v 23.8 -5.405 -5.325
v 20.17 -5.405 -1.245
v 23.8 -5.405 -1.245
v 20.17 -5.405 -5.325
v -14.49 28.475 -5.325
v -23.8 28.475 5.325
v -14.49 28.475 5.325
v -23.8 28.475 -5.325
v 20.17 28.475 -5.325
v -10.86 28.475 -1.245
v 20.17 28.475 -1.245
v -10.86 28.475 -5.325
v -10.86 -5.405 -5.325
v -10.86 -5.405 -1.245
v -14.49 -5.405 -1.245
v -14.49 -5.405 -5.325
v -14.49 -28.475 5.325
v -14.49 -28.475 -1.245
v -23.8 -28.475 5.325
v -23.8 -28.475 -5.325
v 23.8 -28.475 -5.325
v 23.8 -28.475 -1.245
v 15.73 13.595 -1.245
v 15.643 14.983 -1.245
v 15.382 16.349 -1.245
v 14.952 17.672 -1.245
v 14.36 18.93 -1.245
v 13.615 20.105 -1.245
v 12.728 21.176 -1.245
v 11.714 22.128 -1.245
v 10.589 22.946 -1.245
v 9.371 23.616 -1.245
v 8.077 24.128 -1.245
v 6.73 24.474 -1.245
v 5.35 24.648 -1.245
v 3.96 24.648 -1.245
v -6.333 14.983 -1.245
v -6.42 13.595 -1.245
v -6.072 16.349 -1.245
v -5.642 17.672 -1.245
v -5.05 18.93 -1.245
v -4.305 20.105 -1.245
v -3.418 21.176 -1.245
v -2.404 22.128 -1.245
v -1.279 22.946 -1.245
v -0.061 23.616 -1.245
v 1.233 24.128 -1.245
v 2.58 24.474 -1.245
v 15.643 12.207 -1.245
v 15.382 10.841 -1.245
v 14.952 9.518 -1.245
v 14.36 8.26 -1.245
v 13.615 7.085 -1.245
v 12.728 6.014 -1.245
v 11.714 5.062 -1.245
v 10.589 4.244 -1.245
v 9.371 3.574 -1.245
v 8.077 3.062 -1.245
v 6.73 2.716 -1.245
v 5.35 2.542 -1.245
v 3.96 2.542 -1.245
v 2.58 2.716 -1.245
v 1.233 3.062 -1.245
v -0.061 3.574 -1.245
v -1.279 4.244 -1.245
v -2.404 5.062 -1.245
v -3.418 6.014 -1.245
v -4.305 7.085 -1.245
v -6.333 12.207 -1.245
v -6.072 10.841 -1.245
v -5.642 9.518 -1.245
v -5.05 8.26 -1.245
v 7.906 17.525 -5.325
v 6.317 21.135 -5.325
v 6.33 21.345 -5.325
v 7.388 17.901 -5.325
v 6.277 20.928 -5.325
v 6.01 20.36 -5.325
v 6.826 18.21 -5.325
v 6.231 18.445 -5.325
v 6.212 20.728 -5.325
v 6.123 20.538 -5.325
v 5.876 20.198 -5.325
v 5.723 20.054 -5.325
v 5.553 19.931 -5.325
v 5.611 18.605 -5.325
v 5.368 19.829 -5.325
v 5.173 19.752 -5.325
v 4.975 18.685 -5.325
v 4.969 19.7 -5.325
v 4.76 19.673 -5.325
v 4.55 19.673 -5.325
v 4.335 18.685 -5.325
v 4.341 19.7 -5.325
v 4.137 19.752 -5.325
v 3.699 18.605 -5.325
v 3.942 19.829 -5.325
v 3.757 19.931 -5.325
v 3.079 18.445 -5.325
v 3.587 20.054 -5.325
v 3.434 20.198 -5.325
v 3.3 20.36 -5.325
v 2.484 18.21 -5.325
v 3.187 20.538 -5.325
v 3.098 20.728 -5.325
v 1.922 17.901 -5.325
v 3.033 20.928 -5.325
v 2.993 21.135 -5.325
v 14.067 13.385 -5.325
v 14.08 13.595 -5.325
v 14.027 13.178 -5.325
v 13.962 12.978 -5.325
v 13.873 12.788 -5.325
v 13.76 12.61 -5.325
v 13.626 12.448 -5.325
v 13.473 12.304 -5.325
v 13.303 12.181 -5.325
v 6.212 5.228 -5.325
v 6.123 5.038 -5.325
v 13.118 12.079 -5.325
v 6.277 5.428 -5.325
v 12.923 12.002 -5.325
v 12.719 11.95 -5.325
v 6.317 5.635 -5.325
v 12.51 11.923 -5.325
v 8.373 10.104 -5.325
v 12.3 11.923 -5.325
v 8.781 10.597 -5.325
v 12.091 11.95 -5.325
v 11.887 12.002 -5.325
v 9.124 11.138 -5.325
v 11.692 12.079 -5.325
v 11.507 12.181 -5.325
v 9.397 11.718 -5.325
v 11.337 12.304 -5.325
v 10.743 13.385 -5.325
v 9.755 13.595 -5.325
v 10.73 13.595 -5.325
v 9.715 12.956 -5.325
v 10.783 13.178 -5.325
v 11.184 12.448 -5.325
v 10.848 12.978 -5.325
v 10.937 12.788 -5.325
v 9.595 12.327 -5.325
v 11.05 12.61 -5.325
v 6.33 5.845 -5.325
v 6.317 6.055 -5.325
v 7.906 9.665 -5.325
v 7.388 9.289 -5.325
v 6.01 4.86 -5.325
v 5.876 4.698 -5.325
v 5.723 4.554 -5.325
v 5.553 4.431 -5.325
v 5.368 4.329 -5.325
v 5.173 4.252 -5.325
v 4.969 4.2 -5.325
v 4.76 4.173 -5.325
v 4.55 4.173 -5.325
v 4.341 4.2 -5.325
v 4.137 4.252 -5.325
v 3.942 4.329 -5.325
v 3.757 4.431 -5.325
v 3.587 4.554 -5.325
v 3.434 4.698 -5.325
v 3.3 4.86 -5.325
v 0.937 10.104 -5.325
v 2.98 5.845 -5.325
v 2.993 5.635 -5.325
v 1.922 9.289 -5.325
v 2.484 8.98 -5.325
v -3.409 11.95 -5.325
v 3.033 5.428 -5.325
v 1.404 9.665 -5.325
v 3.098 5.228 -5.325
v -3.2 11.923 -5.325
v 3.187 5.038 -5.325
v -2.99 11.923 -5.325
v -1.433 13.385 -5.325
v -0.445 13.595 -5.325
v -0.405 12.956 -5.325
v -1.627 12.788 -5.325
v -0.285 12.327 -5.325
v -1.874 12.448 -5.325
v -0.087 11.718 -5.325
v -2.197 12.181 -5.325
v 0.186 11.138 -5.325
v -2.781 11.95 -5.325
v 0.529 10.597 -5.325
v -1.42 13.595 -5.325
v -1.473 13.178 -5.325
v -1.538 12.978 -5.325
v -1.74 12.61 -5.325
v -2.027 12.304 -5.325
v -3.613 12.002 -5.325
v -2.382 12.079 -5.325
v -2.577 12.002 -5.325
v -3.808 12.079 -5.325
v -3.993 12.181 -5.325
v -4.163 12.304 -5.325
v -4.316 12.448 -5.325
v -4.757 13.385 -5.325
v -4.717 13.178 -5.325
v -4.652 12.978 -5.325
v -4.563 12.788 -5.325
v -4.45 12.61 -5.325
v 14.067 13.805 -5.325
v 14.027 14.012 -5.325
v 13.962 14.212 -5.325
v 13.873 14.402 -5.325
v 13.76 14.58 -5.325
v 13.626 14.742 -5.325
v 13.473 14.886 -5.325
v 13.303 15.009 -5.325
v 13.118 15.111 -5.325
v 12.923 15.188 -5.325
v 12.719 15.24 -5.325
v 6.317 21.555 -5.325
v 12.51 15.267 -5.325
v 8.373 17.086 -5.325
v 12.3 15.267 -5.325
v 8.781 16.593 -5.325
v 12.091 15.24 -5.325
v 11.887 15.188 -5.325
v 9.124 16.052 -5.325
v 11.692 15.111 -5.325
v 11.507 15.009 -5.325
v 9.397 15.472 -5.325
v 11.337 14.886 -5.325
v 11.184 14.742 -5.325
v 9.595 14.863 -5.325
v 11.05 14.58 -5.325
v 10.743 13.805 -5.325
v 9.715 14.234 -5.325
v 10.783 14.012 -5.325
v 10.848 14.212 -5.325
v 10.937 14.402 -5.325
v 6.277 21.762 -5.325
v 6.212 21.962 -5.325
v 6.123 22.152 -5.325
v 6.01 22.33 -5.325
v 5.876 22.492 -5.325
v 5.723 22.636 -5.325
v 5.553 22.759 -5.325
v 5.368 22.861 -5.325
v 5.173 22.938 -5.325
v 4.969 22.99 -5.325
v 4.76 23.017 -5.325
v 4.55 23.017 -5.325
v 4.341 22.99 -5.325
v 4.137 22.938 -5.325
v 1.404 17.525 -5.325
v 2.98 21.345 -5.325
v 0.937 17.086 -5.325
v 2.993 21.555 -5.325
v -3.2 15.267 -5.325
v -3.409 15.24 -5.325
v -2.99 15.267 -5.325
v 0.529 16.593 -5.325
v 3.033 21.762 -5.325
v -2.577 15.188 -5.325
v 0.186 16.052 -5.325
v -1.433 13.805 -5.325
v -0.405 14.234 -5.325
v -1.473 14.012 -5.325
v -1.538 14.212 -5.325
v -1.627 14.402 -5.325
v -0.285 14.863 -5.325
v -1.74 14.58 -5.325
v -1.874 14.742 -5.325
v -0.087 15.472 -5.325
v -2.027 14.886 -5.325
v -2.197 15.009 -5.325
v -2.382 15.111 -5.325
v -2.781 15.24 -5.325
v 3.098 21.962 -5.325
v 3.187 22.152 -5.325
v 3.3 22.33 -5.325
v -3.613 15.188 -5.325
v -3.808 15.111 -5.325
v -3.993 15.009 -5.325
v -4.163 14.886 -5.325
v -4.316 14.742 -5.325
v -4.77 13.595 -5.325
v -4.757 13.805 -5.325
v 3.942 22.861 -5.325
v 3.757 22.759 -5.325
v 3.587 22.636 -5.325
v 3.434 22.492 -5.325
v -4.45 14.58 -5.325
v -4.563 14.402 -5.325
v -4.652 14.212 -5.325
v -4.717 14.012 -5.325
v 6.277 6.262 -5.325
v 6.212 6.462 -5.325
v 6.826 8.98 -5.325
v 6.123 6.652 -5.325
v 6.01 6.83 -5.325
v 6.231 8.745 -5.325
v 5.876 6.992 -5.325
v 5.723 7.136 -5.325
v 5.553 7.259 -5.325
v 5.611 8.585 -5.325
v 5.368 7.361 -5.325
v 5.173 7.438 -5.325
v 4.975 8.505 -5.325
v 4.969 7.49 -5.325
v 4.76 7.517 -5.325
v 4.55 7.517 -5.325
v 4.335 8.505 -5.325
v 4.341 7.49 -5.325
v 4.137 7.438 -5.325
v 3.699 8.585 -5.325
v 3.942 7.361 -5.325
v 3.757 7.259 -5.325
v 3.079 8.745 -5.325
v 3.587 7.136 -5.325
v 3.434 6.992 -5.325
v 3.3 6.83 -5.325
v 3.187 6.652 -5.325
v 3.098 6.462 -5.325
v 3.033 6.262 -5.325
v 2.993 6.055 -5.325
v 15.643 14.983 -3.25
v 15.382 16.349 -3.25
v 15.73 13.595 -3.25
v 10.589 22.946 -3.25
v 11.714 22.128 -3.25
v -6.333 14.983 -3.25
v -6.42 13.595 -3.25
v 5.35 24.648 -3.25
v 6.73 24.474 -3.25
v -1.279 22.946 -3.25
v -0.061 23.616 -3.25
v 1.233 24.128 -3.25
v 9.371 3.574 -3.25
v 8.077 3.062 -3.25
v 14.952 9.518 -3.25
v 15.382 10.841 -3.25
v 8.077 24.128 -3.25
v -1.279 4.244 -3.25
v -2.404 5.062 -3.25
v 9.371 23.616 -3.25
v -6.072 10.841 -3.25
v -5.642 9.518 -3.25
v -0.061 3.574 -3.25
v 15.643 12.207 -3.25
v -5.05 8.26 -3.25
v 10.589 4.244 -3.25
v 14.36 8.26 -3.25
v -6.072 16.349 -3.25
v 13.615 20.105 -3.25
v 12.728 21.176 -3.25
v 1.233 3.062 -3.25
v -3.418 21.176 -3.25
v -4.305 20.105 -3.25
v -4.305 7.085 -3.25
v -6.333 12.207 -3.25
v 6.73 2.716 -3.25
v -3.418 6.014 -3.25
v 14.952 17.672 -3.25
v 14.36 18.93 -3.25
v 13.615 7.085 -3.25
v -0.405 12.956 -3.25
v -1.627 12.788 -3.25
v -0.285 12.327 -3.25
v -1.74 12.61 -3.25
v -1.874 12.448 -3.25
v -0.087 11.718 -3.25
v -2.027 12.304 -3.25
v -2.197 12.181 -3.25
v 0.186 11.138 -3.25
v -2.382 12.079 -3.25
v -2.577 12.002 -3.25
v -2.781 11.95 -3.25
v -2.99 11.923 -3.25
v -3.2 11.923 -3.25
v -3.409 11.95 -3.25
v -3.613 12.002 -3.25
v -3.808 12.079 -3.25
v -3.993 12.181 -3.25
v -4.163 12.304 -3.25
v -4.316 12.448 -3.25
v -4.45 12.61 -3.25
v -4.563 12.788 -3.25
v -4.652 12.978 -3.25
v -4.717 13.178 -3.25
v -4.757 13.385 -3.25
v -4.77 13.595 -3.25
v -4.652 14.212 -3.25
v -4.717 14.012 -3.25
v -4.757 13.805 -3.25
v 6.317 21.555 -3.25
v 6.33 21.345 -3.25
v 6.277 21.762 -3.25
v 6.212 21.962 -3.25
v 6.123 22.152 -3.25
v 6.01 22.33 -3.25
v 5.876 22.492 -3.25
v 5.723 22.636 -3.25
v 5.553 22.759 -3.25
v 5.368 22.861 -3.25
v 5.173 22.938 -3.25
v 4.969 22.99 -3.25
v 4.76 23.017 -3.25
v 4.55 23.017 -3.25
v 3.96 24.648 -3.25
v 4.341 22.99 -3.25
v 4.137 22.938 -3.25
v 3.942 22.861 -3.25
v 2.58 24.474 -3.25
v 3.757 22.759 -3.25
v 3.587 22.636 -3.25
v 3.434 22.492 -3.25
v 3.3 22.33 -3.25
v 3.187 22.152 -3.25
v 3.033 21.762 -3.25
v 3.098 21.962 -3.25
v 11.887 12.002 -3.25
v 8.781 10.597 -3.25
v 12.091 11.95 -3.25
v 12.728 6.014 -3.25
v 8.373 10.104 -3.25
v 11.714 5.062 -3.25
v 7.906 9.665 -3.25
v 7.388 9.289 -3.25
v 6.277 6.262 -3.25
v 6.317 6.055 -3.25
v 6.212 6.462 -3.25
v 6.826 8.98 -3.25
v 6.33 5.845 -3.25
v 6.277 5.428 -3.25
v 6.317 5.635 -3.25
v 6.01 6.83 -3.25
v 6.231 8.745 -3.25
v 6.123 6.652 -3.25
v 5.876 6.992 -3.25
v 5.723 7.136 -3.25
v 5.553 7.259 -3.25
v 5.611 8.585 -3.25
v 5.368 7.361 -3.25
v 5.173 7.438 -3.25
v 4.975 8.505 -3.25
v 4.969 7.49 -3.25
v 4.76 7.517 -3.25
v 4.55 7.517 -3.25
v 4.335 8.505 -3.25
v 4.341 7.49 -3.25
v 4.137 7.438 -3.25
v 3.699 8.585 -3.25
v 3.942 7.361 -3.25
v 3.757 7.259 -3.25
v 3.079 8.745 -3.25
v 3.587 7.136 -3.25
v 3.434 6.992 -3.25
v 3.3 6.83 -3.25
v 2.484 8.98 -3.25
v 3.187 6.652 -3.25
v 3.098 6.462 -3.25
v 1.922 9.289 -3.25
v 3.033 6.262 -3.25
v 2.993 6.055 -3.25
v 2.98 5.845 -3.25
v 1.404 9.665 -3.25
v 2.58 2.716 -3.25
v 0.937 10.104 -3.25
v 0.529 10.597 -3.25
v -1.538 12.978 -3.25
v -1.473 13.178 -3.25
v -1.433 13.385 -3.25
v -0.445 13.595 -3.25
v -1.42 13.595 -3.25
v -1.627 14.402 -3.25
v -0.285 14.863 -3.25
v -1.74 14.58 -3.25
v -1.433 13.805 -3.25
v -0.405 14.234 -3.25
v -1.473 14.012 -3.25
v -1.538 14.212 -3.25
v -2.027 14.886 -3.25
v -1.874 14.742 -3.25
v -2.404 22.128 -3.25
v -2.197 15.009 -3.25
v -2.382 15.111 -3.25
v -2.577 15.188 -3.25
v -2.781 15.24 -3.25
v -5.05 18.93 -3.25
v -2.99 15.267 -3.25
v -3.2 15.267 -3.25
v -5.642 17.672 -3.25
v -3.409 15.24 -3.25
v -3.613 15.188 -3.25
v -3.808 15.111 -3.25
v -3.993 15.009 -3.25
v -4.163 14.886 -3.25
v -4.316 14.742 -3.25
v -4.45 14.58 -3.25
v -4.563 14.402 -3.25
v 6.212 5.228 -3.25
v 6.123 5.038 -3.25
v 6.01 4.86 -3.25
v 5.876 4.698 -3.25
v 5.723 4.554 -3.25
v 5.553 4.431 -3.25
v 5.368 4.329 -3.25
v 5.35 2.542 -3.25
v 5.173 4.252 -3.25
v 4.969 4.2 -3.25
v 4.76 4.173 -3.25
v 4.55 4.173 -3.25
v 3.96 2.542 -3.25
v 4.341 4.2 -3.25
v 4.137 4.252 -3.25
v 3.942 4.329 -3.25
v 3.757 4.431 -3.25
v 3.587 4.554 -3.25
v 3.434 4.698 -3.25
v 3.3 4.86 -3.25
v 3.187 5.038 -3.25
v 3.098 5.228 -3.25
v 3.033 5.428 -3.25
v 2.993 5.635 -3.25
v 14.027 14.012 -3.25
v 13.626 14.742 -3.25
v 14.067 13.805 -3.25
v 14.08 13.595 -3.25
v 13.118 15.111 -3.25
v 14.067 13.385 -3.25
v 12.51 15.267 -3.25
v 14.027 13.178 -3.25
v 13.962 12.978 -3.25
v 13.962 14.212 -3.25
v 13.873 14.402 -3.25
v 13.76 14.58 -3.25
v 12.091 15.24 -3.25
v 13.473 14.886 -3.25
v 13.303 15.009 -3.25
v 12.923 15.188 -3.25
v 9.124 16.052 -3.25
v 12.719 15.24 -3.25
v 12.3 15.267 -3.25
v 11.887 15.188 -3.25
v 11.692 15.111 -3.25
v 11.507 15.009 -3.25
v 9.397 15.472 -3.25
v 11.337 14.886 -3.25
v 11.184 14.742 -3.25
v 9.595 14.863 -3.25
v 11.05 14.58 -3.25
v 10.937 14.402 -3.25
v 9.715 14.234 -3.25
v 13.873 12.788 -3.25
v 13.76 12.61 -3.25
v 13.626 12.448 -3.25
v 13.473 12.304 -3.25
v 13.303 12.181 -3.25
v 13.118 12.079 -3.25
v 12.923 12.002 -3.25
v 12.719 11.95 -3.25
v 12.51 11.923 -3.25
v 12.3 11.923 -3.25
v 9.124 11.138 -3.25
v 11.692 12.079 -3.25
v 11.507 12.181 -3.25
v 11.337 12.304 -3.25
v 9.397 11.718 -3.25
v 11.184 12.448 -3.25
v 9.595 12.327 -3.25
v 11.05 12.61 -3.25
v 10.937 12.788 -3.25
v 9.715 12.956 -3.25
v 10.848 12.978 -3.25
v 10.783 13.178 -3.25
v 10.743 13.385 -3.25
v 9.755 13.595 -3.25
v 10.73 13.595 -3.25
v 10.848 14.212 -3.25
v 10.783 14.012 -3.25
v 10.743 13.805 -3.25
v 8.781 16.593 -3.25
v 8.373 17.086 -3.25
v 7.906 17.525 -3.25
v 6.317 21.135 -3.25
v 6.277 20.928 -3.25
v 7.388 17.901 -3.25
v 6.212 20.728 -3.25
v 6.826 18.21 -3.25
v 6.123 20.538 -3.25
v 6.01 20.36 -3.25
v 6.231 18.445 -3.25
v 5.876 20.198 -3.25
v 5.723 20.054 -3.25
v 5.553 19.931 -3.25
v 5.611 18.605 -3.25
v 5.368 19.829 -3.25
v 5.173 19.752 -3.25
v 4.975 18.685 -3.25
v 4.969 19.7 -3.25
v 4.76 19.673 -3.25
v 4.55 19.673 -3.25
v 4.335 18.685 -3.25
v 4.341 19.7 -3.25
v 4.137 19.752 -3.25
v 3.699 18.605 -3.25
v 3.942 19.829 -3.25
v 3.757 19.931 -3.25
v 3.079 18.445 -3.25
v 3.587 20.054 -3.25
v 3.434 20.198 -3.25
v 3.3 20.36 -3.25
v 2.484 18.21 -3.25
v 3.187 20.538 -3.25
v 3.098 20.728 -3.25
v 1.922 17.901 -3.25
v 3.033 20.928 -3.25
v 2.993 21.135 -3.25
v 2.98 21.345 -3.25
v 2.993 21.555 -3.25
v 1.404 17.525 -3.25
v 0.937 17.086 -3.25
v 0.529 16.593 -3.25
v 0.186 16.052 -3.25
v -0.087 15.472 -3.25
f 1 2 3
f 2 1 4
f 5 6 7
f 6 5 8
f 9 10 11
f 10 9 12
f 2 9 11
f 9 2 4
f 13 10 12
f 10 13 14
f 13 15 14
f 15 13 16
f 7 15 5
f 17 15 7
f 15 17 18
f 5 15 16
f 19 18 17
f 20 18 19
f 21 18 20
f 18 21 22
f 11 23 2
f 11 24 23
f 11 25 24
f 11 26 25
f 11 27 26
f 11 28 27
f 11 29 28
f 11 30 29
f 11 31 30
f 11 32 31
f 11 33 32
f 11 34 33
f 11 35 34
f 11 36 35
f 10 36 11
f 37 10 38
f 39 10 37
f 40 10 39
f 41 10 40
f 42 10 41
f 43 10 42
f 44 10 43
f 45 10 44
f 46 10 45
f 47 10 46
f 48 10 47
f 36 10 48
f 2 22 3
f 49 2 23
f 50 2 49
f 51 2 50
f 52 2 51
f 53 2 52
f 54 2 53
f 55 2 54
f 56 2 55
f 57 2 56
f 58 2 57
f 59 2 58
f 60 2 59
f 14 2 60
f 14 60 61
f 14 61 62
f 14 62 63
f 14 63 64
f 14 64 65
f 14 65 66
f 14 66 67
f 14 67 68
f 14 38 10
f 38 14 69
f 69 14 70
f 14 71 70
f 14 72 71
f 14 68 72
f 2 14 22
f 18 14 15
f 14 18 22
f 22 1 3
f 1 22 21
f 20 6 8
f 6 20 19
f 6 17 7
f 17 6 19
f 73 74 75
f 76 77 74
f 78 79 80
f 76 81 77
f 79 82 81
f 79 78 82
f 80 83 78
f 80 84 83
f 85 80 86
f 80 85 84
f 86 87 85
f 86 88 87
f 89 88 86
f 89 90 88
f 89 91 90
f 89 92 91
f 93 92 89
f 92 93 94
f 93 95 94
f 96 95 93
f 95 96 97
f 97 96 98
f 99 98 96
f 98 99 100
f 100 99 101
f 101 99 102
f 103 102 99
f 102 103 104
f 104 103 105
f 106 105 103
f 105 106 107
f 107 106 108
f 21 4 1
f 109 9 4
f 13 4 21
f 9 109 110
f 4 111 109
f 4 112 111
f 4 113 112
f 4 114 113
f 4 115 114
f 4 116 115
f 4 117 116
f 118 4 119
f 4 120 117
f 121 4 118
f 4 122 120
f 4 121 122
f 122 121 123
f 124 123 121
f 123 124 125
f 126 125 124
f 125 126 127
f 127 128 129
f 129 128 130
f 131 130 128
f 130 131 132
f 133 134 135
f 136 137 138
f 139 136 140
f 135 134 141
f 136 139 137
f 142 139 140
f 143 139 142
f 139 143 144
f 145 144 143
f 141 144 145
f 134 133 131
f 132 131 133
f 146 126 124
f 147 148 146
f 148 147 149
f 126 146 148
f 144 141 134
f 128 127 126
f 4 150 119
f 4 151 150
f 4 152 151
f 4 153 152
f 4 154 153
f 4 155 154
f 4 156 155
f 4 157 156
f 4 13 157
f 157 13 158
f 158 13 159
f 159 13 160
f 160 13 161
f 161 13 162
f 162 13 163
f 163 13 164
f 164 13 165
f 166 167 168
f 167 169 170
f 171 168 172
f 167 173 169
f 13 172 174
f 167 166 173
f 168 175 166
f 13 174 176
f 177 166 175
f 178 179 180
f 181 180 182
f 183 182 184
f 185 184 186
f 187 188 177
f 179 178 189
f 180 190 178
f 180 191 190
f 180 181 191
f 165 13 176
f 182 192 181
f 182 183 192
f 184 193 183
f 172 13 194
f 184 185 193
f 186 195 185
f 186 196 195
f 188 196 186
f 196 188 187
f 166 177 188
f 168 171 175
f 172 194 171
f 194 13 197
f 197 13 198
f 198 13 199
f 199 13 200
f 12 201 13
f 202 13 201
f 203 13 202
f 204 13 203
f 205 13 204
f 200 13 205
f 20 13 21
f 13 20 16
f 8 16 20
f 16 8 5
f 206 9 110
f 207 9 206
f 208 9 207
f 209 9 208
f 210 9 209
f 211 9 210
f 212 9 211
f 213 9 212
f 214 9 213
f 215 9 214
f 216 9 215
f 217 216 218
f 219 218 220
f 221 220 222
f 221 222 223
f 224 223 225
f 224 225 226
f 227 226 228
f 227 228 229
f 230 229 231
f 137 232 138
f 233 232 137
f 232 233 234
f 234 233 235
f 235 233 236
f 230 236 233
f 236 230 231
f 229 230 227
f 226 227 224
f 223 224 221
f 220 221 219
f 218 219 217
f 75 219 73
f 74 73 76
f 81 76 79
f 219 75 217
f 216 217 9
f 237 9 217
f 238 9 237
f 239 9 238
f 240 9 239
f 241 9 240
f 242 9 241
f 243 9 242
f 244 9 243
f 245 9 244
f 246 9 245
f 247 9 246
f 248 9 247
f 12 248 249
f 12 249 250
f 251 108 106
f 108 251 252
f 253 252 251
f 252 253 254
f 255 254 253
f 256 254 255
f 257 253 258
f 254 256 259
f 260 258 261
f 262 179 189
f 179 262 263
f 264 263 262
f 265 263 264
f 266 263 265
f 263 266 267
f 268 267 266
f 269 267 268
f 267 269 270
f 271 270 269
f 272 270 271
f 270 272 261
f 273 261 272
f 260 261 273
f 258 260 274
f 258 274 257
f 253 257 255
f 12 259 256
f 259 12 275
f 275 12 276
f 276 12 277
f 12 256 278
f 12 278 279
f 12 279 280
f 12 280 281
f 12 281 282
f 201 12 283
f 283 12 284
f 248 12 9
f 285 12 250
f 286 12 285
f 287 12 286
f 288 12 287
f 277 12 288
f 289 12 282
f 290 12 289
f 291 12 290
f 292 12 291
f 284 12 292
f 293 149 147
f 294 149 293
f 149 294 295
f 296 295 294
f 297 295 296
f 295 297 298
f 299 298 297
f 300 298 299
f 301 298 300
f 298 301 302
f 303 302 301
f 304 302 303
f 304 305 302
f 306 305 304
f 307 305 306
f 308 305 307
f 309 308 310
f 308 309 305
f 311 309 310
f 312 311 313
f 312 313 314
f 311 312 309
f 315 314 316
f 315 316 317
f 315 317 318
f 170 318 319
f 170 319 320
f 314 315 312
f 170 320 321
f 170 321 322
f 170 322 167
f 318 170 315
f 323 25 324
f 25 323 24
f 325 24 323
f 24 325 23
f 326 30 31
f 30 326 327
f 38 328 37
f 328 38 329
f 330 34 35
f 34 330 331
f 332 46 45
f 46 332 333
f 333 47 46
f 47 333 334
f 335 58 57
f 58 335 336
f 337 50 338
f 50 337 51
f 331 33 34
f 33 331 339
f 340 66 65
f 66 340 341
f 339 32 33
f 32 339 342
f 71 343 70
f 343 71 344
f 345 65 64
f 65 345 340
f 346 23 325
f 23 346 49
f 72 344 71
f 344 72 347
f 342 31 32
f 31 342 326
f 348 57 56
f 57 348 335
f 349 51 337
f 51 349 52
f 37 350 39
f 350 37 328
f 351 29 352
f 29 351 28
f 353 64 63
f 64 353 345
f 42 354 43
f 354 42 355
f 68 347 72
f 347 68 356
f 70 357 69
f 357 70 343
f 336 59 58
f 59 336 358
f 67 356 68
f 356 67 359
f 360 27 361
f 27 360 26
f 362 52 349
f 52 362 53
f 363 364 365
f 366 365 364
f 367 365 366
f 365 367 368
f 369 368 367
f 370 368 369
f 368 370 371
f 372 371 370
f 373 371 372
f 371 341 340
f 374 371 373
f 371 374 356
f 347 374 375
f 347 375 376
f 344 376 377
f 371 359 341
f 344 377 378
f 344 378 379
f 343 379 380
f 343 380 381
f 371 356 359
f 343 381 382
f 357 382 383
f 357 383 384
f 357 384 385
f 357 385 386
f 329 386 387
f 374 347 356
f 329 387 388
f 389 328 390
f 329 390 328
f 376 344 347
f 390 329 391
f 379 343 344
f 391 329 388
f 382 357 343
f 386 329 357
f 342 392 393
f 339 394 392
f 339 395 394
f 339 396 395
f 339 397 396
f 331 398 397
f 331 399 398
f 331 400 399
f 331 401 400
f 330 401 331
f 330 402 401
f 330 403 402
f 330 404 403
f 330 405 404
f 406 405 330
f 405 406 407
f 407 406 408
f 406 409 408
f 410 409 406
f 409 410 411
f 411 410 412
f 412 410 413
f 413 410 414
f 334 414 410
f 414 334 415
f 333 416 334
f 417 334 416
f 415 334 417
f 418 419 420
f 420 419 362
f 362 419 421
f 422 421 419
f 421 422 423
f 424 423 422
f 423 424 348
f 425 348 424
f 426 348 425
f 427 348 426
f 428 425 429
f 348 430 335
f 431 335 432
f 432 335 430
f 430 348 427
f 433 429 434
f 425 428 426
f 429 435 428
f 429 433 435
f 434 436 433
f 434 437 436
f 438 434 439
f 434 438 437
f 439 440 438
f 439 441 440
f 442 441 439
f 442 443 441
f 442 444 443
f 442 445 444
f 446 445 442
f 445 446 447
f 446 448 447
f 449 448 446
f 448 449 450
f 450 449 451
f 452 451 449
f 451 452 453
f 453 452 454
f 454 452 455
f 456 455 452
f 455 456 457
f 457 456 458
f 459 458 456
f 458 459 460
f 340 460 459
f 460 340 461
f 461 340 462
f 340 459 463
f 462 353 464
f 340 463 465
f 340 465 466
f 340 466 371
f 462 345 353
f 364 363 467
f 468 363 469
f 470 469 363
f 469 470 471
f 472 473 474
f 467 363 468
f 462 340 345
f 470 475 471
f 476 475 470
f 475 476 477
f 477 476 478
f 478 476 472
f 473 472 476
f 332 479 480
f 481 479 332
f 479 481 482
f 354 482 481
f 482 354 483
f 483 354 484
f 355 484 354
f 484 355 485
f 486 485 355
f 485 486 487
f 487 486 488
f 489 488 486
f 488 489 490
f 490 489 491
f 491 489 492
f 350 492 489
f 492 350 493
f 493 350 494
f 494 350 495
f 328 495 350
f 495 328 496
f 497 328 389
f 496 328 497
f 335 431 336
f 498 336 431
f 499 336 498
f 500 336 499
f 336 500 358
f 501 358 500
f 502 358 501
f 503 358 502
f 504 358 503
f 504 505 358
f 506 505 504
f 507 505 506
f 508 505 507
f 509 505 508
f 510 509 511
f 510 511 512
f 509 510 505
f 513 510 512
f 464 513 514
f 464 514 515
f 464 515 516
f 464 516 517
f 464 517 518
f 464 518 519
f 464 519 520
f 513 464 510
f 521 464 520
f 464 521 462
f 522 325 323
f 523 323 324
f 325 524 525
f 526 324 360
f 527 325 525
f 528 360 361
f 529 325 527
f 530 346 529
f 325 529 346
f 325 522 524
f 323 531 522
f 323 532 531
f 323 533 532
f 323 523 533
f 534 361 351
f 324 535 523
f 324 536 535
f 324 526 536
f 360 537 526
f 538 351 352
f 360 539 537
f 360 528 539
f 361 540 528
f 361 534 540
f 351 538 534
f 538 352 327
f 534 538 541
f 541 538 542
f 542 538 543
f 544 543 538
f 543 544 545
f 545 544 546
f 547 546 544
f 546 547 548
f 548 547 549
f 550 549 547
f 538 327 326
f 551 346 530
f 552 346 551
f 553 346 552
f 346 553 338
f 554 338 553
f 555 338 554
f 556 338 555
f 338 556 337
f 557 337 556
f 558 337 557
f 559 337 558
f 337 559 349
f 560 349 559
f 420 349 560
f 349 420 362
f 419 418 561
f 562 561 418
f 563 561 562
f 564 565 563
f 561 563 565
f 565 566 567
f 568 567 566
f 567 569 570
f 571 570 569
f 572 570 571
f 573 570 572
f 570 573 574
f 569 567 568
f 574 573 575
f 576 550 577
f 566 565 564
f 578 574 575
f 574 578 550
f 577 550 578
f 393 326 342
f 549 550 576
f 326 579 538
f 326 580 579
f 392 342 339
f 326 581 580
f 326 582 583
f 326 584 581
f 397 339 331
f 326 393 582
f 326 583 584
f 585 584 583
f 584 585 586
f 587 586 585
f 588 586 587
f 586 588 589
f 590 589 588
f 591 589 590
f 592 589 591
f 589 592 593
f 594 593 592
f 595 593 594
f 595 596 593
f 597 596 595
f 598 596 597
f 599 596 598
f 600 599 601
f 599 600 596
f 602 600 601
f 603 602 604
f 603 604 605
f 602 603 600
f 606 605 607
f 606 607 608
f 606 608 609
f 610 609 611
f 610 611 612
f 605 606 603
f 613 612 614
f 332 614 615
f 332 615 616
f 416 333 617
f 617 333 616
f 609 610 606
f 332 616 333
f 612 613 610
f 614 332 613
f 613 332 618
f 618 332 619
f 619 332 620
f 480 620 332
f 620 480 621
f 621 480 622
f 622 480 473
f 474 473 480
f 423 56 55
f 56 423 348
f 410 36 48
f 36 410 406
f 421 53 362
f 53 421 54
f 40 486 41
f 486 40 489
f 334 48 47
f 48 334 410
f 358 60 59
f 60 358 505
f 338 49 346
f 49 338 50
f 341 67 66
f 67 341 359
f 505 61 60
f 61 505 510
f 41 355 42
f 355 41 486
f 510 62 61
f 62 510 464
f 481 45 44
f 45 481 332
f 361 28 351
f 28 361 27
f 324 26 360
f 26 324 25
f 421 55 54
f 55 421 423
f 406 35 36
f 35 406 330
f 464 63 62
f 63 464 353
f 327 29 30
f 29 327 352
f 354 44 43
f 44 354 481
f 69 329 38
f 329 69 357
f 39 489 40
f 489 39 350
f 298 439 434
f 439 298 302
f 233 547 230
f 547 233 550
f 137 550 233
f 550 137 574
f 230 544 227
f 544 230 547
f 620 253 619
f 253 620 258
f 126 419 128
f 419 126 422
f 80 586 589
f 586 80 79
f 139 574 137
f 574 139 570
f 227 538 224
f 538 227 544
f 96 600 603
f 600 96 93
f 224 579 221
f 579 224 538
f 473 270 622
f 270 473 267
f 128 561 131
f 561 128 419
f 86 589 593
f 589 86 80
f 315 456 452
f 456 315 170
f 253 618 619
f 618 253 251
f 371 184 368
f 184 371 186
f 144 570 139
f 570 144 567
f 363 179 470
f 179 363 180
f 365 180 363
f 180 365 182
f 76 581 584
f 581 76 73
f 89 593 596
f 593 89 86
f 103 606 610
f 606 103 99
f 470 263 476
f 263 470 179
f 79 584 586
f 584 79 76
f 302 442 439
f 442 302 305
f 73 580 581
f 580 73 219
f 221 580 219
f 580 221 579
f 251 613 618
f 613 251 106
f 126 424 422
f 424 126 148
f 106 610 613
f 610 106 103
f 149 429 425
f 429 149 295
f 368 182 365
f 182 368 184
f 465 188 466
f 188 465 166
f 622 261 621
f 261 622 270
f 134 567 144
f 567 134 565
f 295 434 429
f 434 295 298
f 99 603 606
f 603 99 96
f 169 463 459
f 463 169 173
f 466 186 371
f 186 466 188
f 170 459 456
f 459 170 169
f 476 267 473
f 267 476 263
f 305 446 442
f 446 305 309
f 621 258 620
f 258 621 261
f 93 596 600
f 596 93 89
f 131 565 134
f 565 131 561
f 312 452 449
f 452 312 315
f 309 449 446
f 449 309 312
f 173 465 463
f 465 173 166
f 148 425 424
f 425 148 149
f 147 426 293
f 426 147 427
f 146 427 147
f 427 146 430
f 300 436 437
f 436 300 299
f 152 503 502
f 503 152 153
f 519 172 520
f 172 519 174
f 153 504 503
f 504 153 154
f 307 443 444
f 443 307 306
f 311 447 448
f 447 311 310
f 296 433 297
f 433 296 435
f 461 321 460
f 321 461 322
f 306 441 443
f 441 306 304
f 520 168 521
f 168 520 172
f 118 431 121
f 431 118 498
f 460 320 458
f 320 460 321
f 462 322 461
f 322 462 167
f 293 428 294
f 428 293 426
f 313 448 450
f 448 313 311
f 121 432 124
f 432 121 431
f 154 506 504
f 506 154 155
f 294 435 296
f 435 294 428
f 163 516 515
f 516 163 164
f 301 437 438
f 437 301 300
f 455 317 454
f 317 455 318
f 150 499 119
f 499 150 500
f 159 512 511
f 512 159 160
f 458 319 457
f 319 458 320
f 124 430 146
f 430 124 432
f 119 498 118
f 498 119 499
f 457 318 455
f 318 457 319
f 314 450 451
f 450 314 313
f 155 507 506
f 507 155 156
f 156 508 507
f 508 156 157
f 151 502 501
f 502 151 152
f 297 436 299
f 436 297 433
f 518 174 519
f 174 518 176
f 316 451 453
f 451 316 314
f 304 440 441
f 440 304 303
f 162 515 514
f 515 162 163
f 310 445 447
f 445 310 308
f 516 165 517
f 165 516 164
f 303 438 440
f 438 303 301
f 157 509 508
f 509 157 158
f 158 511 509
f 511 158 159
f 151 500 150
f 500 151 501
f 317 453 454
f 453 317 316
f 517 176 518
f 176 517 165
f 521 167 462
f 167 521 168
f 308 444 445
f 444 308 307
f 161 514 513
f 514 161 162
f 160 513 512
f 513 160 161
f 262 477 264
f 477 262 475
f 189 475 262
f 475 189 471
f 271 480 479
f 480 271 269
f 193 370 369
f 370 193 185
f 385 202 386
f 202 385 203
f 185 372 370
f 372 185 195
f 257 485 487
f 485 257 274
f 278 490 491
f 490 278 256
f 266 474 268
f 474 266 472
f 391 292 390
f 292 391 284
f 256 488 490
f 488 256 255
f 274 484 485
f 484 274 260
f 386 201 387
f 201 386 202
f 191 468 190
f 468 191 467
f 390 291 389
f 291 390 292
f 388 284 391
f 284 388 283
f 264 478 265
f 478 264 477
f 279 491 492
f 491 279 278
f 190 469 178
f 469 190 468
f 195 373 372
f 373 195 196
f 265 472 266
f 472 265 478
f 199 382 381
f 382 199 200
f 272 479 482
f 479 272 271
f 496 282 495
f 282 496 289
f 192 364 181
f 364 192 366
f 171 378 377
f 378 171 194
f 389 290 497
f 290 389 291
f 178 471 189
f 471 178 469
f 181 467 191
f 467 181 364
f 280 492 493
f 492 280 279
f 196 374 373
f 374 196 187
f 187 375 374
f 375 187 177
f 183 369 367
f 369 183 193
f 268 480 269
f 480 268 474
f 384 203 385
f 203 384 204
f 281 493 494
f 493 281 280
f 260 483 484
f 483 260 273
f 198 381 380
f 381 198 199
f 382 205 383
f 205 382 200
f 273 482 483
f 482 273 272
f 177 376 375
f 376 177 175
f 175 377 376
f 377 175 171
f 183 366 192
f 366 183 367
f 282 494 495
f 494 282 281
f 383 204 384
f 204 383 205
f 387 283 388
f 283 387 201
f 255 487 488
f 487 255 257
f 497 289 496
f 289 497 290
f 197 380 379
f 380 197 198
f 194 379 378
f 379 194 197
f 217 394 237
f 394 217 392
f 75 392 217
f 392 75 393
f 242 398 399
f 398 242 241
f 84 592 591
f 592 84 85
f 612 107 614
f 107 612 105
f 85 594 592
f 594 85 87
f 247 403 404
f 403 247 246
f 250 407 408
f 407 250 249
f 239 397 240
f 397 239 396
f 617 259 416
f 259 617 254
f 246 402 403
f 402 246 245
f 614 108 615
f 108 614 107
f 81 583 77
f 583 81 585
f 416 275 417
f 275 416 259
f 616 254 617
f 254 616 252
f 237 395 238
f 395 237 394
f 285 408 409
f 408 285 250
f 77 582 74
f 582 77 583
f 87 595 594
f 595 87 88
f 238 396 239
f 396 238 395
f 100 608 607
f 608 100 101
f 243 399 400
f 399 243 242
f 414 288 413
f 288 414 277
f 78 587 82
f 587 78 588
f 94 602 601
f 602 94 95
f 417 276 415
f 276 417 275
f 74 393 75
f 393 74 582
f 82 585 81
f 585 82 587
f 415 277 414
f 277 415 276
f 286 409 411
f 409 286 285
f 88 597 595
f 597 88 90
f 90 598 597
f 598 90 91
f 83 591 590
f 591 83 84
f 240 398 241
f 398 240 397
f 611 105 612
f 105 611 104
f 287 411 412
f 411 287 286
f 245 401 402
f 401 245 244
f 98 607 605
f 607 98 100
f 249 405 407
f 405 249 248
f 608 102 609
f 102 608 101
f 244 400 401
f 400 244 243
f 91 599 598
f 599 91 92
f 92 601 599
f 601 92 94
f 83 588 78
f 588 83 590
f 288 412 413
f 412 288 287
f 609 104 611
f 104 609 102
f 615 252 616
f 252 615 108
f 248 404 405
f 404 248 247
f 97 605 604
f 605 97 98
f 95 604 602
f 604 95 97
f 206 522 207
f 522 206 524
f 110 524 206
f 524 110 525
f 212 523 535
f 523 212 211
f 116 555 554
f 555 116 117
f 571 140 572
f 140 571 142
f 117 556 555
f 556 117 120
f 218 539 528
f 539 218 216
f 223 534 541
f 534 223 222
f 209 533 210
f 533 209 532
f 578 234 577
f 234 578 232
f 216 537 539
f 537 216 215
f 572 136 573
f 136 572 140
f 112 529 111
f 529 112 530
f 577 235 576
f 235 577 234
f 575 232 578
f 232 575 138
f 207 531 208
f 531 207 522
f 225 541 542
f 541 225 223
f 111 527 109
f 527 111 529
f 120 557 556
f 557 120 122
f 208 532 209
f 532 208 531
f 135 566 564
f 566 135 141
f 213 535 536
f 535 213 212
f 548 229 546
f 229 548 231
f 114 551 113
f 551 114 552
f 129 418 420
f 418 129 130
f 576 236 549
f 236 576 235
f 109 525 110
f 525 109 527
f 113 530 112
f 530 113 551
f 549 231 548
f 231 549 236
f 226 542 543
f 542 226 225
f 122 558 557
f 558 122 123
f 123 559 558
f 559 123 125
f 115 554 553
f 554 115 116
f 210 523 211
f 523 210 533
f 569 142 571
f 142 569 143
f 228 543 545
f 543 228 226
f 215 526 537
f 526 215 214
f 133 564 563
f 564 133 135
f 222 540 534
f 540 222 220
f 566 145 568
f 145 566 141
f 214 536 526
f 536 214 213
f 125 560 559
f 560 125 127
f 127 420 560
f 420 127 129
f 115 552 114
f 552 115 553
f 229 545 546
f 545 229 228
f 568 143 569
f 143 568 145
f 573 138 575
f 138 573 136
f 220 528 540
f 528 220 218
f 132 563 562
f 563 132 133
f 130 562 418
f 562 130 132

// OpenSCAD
$fn=50;


height=59.35 - 2.4;
width=47.60;
thickness=10.65;

topWidth=38.29;
topHeight=23.70;
bottomWidth=31.10;
bottomHeight=height-topHeight;
thickness3=6.57;



diameter=28.88;



circleThickness=2;
radius=diameter/2 + 1;

smallRecHeight=8.38;
smallRecWidth=3.33;
cuttingWidth=23.59;
cuttingHeight=14.69;
extraHeight = (height - (smallRecHeight + cuttingHeight));
extraWidth = 3.63;

bigCircleDiameter=27.33;
topHalfHeight=29.63;
remaindingHeight=height-topHalfHeight;

hex_nut_diameter=7.89 + 1.6; // +1.6, 
hex_nut_radius=hex_nut_diameter/2;
hex_nut_thickness=3.85;

hex_nut_inner_diameter= 5.8;//5;
hex_nut_inner_radius=hex_nut_inner_diameter/2 + .4;



temp=(thickness/2) - (thickness - thickness3);
offsetFromCenter=19; //19.25; //1.5 // 2.3
hexNutGroveExtraDepth=2;

screwRadius=1.75;
screwDepth=9.35;

module part1(){
translate([(width/2) - (topWidth/2) ,(thickness/2) - (thickness3)/2,0]) color("blue") difference(){    
    difference(){
cube([topWidth, thickness3, height], center=true);  

union(){
color("blue") translate([topWidth/2 - (extraWidth/2),0,-extraHeight/2 + ( (height/2) - (smallRecHeight + cuttingHeight) )]) cube([extraWidth,thickness3 ,extraHeight],center=true);

color("blue") translate([ -(topWidth/2 - (extraWidth/2)),0,-extraHeight/2 + ( (height/2) - (smallRecHeight + cuttingHeight) )]) cube([extraWidth,thickness3 ,extraHeight],center=true);
}


//translate([0,0,extraHeight - (height/2) - offsetFromCenter]) union(){
//    //-(remaindingHeight/2) + (hex_nut_radius)
//translate([0,5,0]) color("black") rotate([90,0,0]) cylinder(h=hex_nut_thickness/2 + hexNutGroveExtraDepth + 1.3, r=hex_nut_radius,center=true, $fn = 6); //h=thickness3
////-(remaindingHeight/2) + (hex_nut_inner_radius + (hex_nut_radius - hex_nut_inner_radius))
//translate([0, 0,0]) color("red") rotate([90,0,0]) cylinder(h=hex_nut_thickness/2 + 10, r=hex_nut_inner_radius,center=true, $fn = 6);
//}


}
union(){
    translate([0,-((-(thickness3/2)+(thickness3-circleThickness)/2)),(height/2) - (smallRecHeight + cuttingHeight) ]) union(){
translate([0,0,(cuttingHeight/2) + (smallRecHeight)]) cube([cuttingWidth,thickness3 - circleThickness +.1, cuttingHeight],center=true);
                 translate([0,0,smallRecHeight/2]) cube([smallRecWidth,thickness3 - circleThickness+.1,smallRecHeight],center=true);            
}


translate([0,-(thickness3/2 - (circleThickness/2)),(height/2) - (radius)]) color("red")rotate([90,0,0])union(){
        cylinder(h=circleThickness, r=radius, center=true);
        translate([0,radius/2,0])cube([radius*2,radius,circleThickness],center=true);
    }
    
    }

}
}


module part2(){
//translate([0,temp,0]) 
difference(){
cube([width,thickness,height],center=true);
//translate([0,(thickness/2) - (thickness - thickness3)/2,0]) color("blue") cube([topWidth,thickness - thickness3,height],center=true);
//
translate([(width/2) - (topWidth/2),(thickness/2) - (thickness3)/2,0]) color("blue") union(){
cube([topWidth, thickness3, height], center=true);   
union(){
color("red") translate([topWidth/2 - (extraWidth/2),0,-extraHeight/2 + ( (height/2) - (smallRecHeight + cuttingHeight) )]) cube([extraWidth,thickness3+10 ,extraHeight],center=true);

color("red") translate([ -(topWidth/2 - (extraWidth/2)),0,-extraHeight/2 + ( (height/2) - (smallRecHeight + cuttingHeight) )]) cube([extraWidth,thickness3+10,extraHeight],center=true);
}


//translate([0,0, extraHeight - (height/2)  - offsetFromCenter]) union(){
//    
//translate([0, -temp - (hex_nut_thickness/2) - .8,0]) color("red") rotate([90,0,0]) cylinder(h=hex_nut_thickness/2 + hexNutGroveExtraDepth, r=hex_nut_radius,center=true, $fn = 6);
//
//translate([0, -temp - (hex_nut_thickness/2),0]) color("red") rotate([90,0,0]) cylinder(h=hex_nut_thickness/2 + 7, r=hex_nut_inner_radius,center=true, $fn = 6);
//}


}
}

}

module glueScrews(){
translate([0,0.1,0]) union(){
rotate([90,0,0]) translate([(width/2) - (topWidth/2) - (topWidth/4),-(height/3),-(thickness-screwDepth)/2]) cylinder(h=screwDepth,r=screwRadius,center=true);

rotate([90,0,0]) translate([(width/2) - (topWidth/2) + (topWidth/4),-(height/9),-(thickness-screwDepth)/2]) cylinder(h=screwDepth,r=screwRadius,center=true);
}
}


module modifiedParts(part=1){


difference(){
    
        if(part == 1){
            part1();
        }else if(part == 2){
            part2();
        }
//        part2();    

    
//translate([(width/2) - (topWidth/2),0,extraHeight - (height/2) - offsetFromCenter]) union(){
//    //-(remaindingHeight/2) + (hex_nut_radius)
//    
//    //((hex_nut_thickness/2 + 10)/2)-(hex_nut_thickness/2 + hexNutGroveExtraDepth + 1.3)/2
//
//    
////-(remaindingHeight/2) + (hex_nut_inner_radius + (hex_nut_radius - hex_nut_inner_radius))
//
//
//translate([0,0,0]) color("black") rotate([90,0,0]) cylinder(h=hex_nut_thickness, r=hex_nut_radius,center=true, $fn = 6); //h=thickness3
//
//translate([0, 0,0]) color("red") rotate([90,0,0]) cylinder(h=hex_nut_thickness+ 20, r=hex_nut_inner_radius,center=true, $fn = 6);
//    
//
////    glueScrews();
//}

}
}

//translate([3.5,11,0]) cylinder(d=21.95,h=3.5,$fn=50,center=true);

//translate([(width/2) - (topWidth/2),-(extraHeight - (height/2) - offsetFromCenter),0]) cylinder(d=21.95,h=3.5,$fn=50,center=true);

//union(){
//translate([(width/2) - (topWidth/2),-(extraHeight - (height/2) - offsetFromCenter)-7.75,0]) cylinder(h=15,d=3.75,center=true);
//translate([(width/2) - (topWidth/2) -7.75,-(extraHeight - (height/2) - offsetFromCenter),0]) cylinder(h=15,d=3.75,center=true);
//translate([(width/2) - (topWidth/2) +7.75,-(extraHeight - (height/2) - offsetFromCenter),0]) cylinder(h=15,d=3.75,center=true);
//translate([(width/2) - (topWidth/2) ,-(extraHeight - (height/2) - offsetFromCenter) + 7.75,0]) cylinder(h=15,d=3.75,center=true);
//}


//rotate([-90,0,0]) difference(){
//modifiedParts(1);
//   glueScrews(); 
//}

//rotate([90,0,0]) translate([(width/2) - (topWidth/2),-(0),extraHeight - (height/2) - offsetFromCenter]) cylinder(d=21.95,h=3.5,$fn=50,center=true);

//rotate([90,0,0]) modifiedParts(1);

difference(){
difference(){
rotate([90,0,0]) difference(){

modifiedParts(2);
//    translate([(width/2) - (topWidth/2),-(extraHeight - (height/2) - offsetFromCenter),0]) cylinder(d=21.95,h=3.5,$fn=50,center=true);
//    glueScrews();
    
}

difference(){
//translate([0,0,.85])
    union(){
//translate([(width/2) - (topWidth/2),-(extraHeight - (height/2) - offsetFromCenter) ,-1.5]) cylinder(d=21.95 + .2,h=3.5,$fn=50,center=true);
//    
//    translate([(width/2) - (topWidth/2),-(extraHeight - (height/2) - offsetFromCenter),0]) cylinder(h=15,d=10 + .2,center=true);
    
    translate([(width/2) - (topWidth/2),-(extraHeight - (height/2) - offsetFromCenter) ,-1.5]) cylinder(d=21.95 + .2,h=3.5,$fn=50,center=true);
    
    translate([(width/2) - (topWidth/2),-(extraHeight - (height/2) - offsetFromCenter),0]) cylinder(h=15,d=10 + .2,center=true);
}


}

}


union(){
translate([(width/2) - (topWidth/2),-(extraHeight - (height/2) - offsetFromCenter)-7.75 ,0]) cylinder(h=15,d=3.75 - .4,center=true);
translate([(width/2) - (topWidth/2) -7.75 ,-(extraHeight - (height/2) - offsetFromCenter),0]) cylinder(h=15,d=3.75 - .4,center=true);
translate([(width/2) - (topWidth/2) ,-(extraHeight - (height/2) - offsetFromCenter) + 7.75 ,0]) cylinder(h=15,d=3.75 - .4,center=true);
translate([(width/2) - (topWidth/2) +7.75 ,-(extraHeight - (height/2) - offsetFromCenter),0]) cylinder(h=15,d=3.75 - .4,center=true);

}

}
